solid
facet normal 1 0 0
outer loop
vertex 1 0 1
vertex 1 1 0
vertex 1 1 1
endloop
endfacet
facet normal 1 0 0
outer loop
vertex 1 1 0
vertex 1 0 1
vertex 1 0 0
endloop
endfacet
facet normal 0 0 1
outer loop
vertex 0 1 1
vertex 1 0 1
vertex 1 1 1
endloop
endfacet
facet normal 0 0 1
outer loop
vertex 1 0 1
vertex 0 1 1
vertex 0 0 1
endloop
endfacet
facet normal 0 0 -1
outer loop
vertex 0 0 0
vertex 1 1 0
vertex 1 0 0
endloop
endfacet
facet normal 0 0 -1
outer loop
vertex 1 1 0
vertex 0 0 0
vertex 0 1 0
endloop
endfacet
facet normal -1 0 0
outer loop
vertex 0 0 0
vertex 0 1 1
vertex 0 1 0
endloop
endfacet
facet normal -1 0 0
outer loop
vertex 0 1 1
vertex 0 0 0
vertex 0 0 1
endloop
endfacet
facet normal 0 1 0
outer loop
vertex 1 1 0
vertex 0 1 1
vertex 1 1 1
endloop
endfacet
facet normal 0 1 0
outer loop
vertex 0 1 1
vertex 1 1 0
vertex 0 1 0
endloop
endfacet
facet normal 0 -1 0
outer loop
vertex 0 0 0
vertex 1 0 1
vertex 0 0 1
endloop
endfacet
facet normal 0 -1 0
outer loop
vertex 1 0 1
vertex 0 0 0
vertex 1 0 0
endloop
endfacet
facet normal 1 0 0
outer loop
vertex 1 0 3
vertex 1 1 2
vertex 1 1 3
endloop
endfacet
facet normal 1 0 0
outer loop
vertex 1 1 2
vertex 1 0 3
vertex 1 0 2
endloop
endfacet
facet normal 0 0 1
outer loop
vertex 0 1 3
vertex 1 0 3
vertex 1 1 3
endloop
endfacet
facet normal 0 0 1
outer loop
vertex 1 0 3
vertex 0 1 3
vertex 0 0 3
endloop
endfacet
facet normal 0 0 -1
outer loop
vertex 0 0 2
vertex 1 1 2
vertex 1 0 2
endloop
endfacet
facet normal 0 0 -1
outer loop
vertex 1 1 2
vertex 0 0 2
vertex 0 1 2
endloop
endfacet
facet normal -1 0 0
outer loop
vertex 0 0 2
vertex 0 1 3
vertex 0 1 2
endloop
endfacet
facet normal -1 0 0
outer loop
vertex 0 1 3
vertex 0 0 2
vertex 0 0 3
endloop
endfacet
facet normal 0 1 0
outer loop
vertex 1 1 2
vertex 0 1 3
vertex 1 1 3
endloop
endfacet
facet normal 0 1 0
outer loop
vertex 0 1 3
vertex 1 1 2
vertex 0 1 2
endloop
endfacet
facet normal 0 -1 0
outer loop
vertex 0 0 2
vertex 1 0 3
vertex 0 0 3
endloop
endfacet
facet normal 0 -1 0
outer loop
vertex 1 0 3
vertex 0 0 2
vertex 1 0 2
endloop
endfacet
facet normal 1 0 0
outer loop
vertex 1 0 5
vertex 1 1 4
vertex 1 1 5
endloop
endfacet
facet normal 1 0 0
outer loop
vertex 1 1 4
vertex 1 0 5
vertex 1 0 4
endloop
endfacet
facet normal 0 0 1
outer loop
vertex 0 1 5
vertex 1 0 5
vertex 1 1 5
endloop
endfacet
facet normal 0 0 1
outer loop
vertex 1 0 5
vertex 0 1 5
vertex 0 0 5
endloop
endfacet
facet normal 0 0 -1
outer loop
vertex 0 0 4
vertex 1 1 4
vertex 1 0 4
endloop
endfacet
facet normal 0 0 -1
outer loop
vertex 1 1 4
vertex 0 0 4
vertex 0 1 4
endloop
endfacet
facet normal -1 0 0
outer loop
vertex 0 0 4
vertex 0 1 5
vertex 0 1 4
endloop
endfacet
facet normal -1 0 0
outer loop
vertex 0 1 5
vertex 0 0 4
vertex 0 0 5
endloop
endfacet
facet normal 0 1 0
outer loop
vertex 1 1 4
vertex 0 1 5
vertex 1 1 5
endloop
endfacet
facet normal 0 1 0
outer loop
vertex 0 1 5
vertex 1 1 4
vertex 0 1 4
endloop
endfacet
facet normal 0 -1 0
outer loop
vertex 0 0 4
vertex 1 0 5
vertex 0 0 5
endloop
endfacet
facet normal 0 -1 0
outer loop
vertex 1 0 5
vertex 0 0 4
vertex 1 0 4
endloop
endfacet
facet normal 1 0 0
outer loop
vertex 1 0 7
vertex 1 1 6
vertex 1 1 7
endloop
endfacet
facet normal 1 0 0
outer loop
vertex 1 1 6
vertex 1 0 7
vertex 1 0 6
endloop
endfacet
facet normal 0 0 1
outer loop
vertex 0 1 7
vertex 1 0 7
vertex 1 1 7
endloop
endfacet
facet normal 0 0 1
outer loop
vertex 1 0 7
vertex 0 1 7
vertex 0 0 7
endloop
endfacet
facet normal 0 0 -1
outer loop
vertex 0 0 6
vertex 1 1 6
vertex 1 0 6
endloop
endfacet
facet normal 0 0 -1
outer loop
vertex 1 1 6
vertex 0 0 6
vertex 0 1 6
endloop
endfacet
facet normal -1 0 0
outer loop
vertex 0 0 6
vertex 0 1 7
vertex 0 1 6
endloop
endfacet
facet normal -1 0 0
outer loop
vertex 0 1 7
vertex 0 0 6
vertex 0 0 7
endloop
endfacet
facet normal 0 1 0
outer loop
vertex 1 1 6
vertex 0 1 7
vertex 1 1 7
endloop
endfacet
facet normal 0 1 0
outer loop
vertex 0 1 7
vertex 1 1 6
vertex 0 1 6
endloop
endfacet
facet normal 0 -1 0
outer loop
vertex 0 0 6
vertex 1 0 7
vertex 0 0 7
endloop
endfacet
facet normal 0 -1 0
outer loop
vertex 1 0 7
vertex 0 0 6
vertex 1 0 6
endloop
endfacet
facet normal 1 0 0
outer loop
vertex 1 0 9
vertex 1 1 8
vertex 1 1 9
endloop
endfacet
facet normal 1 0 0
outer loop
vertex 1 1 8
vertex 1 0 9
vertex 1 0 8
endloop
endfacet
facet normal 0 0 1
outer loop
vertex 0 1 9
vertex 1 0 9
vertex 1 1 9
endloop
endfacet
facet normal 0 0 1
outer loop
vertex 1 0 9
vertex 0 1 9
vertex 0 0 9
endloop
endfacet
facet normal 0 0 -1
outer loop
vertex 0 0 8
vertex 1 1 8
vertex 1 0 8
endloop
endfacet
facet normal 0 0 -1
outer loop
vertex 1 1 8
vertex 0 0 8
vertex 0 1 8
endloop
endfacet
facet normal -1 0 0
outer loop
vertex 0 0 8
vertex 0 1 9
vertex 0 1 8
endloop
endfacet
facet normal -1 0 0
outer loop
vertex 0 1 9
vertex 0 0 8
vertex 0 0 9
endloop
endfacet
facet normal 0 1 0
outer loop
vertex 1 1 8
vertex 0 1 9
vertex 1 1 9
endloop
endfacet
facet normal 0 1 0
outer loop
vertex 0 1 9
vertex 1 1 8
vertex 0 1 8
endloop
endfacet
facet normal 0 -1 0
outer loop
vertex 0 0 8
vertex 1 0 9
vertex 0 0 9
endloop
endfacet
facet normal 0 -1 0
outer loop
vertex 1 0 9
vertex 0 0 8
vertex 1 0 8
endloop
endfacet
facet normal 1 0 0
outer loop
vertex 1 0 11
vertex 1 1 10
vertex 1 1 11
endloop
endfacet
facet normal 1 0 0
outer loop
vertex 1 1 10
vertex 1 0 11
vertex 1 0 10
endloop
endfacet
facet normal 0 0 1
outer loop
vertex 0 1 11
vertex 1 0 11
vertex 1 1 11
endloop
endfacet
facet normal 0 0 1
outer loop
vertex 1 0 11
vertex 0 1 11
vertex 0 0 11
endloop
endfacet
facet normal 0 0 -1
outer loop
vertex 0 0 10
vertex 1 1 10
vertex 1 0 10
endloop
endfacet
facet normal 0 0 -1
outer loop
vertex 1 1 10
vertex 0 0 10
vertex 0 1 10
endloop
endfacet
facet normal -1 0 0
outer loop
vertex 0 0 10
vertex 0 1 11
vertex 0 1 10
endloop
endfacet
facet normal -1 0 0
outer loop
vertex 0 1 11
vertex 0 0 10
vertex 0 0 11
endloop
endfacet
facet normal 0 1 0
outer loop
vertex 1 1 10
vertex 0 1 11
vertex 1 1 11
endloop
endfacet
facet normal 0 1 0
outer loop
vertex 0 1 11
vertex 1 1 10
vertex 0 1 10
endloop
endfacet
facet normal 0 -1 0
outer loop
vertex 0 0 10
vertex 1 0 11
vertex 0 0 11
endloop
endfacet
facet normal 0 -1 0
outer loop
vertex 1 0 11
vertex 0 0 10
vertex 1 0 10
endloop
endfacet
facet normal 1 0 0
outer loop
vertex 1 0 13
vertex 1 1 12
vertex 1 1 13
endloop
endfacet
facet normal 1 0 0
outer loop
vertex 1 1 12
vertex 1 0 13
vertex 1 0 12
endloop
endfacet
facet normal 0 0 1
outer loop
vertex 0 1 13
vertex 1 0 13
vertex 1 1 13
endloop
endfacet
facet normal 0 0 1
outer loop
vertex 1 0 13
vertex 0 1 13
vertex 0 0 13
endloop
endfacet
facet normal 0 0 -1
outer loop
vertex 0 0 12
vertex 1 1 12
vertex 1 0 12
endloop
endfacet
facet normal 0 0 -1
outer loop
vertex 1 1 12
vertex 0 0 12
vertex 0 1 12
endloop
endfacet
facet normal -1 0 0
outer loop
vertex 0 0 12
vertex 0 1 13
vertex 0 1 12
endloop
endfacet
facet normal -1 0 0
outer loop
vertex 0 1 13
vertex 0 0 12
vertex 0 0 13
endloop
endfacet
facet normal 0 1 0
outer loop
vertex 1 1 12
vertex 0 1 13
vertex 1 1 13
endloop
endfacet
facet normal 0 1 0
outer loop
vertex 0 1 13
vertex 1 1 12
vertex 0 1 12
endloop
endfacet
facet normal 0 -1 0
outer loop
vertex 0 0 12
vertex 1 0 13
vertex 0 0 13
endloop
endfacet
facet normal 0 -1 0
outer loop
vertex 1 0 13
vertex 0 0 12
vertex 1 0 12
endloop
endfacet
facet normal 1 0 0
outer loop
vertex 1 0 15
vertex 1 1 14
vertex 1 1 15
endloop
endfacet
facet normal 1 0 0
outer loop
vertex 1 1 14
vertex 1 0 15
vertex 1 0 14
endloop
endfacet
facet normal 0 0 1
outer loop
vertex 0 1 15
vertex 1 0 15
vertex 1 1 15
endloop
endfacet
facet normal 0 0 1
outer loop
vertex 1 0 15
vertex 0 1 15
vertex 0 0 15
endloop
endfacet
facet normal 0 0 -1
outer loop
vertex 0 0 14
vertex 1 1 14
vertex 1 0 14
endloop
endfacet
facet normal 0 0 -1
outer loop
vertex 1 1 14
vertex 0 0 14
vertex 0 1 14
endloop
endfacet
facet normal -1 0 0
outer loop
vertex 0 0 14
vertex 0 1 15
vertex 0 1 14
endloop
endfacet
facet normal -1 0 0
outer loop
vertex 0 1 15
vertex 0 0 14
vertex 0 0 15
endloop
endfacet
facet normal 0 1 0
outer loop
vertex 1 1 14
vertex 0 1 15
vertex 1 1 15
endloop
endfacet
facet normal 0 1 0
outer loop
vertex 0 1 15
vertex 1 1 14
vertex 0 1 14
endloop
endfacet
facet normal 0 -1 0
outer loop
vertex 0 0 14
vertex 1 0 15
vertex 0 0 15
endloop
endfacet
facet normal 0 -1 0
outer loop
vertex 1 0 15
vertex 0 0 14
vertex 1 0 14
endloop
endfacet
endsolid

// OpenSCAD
number_of_cubes = 7; //[]
alt_color = "red"; //[red, blue, green]

union() {
	for(scad_for_index = [0:1:number_of_cubes]) {
		translate(v = [0, 0, (scad_for_index * 2)]) {
			union() {
				if(((scad_for_index % 2) == 0)) {
					cube();

				} else {
					color(alpha = 1.0, c = alt_color) {
						cube();
					}

				}
			}
		}

	}
}
